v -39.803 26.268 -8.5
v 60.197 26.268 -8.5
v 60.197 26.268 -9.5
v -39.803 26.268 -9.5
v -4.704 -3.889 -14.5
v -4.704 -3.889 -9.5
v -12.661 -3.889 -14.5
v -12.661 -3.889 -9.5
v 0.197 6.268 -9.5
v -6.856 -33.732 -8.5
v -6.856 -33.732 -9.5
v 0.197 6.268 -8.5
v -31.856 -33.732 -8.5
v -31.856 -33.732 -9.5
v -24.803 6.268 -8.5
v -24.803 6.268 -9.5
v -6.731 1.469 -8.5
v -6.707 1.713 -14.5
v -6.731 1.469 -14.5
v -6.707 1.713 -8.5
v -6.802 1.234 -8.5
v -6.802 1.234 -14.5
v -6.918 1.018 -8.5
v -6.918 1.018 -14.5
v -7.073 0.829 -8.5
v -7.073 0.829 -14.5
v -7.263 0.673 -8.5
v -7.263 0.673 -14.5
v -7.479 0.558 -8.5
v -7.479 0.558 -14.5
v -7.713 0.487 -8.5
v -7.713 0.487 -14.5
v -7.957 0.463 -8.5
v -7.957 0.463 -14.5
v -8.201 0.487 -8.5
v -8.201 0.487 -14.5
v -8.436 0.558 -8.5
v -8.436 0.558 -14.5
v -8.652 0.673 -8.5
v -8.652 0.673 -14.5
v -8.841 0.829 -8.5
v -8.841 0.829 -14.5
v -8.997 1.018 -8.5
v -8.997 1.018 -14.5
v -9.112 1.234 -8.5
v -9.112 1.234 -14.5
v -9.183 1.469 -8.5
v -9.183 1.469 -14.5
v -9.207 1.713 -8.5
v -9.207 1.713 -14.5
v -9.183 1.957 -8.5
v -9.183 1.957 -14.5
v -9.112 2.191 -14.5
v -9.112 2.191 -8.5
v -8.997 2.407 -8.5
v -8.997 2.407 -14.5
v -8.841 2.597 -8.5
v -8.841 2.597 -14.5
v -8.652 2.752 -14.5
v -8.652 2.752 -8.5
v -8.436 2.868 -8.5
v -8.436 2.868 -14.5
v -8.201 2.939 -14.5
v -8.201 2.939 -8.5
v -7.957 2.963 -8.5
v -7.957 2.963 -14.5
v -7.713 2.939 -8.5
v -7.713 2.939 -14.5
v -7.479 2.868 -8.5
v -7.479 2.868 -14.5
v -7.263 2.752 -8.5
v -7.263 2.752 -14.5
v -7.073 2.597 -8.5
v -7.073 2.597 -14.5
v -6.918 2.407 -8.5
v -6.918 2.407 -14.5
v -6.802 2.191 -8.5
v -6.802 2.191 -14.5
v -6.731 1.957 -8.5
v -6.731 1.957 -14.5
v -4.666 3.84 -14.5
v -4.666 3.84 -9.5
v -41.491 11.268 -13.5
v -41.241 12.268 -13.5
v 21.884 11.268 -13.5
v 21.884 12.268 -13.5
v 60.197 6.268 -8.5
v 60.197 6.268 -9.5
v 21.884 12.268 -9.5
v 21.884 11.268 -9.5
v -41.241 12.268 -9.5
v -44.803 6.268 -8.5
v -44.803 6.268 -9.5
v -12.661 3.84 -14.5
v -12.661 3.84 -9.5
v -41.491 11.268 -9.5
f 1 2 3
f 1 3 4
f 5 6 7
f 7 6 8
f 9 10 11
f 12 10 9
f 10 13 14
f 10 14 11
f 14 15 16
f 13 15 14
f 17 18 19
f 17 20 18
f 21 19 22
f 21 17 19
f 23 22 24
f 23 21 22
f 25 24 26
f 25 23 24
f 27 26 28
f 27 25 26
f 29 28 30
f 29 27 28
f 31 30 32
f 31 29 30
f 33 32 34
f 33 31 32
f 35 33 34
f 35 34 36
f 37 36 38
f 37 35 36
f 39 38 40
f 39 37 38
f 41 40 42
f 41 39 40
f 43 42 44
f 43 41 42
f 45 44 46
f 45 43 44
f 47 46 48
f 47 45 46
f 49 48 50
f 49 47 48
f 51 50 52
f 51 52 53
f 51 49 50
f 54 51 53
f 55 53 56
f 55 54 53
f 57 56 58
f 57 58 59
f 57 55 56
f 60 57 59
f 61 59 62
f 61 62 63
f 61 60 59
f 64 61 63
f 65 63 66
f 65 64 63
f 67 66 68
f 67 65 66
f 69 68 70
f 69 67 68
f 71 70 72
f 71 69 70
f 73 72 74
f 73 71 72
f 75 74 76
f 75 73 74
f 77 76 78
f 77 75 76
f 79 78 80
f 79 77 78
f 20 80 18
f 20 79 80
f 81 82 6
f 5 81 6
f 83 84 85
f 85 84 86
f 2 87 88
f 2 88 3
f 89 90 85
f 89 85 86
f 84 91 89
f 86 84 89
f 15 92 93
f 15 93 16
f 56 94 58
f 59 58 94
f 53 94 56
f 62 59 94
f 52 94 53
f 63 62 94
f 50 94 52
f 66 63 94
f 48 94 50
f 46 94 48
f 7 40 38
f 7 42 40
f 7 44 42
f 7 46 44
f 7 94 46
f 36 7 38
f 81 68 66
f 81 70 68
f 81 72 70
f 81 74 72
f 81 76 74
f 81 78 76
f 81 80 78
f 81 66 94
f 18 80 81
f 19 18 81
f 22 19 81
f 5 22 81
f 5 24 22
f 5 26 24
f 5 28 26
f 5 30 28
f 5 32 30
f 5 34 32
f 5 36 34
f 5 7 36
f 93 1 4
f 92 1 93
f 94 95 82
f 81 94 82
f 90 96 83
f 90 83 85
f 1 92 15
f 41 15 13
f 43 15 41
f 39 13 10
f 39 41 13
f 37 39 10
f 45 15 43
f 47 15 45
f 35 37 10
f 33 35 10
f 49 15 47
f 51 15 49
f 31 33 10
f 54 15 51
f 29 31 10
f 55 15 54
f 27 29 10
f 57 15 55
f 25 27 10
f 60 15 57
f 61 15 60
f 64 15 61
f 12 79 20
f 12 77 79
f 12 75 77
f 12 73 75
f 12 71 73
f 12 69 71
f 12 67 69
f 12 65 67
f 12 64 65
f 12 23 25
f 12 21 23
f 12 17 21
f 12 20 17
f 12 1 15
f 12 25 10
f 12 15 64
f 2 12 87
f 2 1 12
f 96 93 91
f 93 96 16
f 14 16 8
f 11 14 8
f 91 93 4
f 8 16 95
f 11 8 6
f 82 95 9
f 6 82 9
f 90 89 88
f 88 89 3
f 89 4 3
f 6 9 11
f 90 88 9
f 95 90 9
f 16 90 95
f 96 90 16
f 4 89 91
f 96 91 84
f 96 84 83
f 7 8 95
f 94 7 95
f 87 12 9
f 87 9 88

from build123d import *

# Parameters (mm, degrees)
F1_DEPTH  = 9.5
F3_DEPTH  = 18
F4_R      = 4.5
F5_DEPTH  = 40
F7_DEPTH  = 1
F9_DEPTH  = 5
F8_W      = 1
F8_H      = 3
F10_DEPTH = 18
F11_DEPTH = 18
F12_R     = 1
F13_DEPTH = 6.9
F15_DEPTH = 3
F16_R     = 1.25
F17_DEPTH = 5
F18_DEPTH = 18
F19_DEPTH = 10
F20_DEPTH = 5
F21_R     = 1.25
F22_DEPTH = 5


with BuildPart() as f1:
    # F0 (on Top) → F1 (new body, symmetric)
    with BuildSketch(Plane.XY):
        Polygon((60.1971853051, 26.2679918303), (-39.8028146949, 26.2679918303), (-44.8028146949, 6.2679918303), (-24.8028146949, 6.2679918303), (-31.8558939232, -33.7320081697), (-6.8558939232, -33.7320081697), (0.1971853051, 6.2679918303), (60.1971853051, 6.2679918303), align=None)
    extrude(amount=F1_DEPTH, both=True)

    # F2 (on face) → F3 (cut)
    with BuildSketch(Plane.XY.offset(9.5)):
        Polygon((21.8837381179, 24.7679918303), (-38.1162618821, 24.7679918303), (-42.2412618821, 8.2679918303), (-22.4193075097, 8.2679918303), (-27.2986237894, -19.4039858791), (-6.3603302369, -19.4039858791), (-1.8336679186, 6.2679918303), (-17.4193075097, 6.2679918303), (-17.4193075097, 8.2679918303), (56.8837381179, 8.2679918303), (56.8837381179, 11.2679918303), (21.8837381179, 11.2679918303), align=None)
    extrude(amount=-F3_DEPTH, mode=Mode.SUBTRACT)

    # F4 (on face) → F5 (cut)
    with BuildSketch(Plane.YZ.offset(60.1971853051)):
        with Locations((19.7679918303, 0)):
            Circle(F4_R)
    extrude(amount=-F5_DEPTH, mode=Mode.SUBTRACT)

    # F6 (on Top) → F7 (cut, symmetric)
    with BuildSketch(Plane.XY):
        Polygon((21.808039397, 22.0530666411), (21.808039397, 29.0336320457), (-29.6180322766, 28.4013450146), (-29.6180322766, 22.0530666411), align=None)
    extrude(amount=F7_DEPTH, both=True, mode=Mode.SUBTRACT)

    # F8 (on face) → F9 (join)
    with BuildSketch(Plane.XY.offset(-8.5)):
        Polygon((-41.4912618821, 11.2679918303), (21.8837381179, 11.2679918303), (21.8837381179, 12.2679918303), (20.8837381179, 12.2679918303), (-41.2412618821, 12.2679918303), align=None)
    extrude(amount=F9_DEPTH)

    # F8 (on face) → F10 (join, through all)
    with BuildSketch(Plane.XY.offset(-8.5)):
        with Locations((21.3837381179, 23.2679918303)):
            Rectangle(F8_W, F8_H)
    extrude(amount=F10_DEPTH)

    # F8 (on face) → F11 (join, through all)
    with BuildSketch(Plane.XY.offset(-8.5)):
        with Locations((21.3837381179, 13.7679918303)):
            Rectangle(F8_W, F8_H)
    extrude(amount=F11_DEPTH)

    # F12 (on face) → F13 (cut)
    with BuildSketch(Plane.XZ.offset(-6.2679918303)):
        with Locations((52.1971853051, 0)):
            Circle(F12_R)
    extrude(amount=-F13_DEPTH, mode=Mode.SUBTRACT)

    # F14 (on Top) → F15 (cut, symmetric)
    with BuildSketch(Plane.XY):
        Polygon((7.0393216934, 1.2679918303), (-9.7211528242, 1.2679918303), (-8.9475925263, -10.7320081697), (7.0393216934, -10.7320081697), align=None)
    extrude(amount=F15_DEPTH, both=True, mode=Mode.SUBTRACT)

    # F16 (on face) → F17 (cut)
    with BuildSketch(Plane.XY.offset(-8.5)):
        with Locations((-7.9571865499, 1.7126952298)):
            Circle(F16_R)
    extrude(amount=-F17_DEPTH, mode=Mode.SUBTRACT)

    # F18 (cut): a face of the model
    f18_faces = [f1.faces().sort_by_distance(p)[0] for p in [
        (30.1971853051, 7.4773304926, 9.5),
    ]]
    extrude(f18_faces, amount=-F18_DEPTH, mode=Mode.SUBTRACT)

    # F19 (add): a face of the model
    f19_faces = [f1.faces().sort_by_distance(p)[0] for p in [
        (-9.7413030547, 11.7676624495, -3.5),
    ]]
    extrude(f19_faces, amount=-F19_DEPTH)

    # F20 (cut): a face of the model
    f20_faces = [f1.faces().sort_by_distance(p)[0] for p in [
        (-9.7413030547, 11.7676624495, -3.5),
    ]]
    extrude(f20_faces, amount=-F20_DEPTH, mode=Mode.SUBTRACT)

    # F21 (on face) → F22 (join)
    with BuildSketch(Plane(origin=(0, 0, -9.5), x_dir=(1, 0, 0), z_dir=(0, 0, -1))):
        Polygon((-12.660975568, -3.839584766), (-4.6663652174, -3.839584766), (-4.7040209174, 3.888861509), (-12.660975568, 3.888861509), align=None)
        with Locations((-7.9571865499, -1.7126952298)):
            Circle(F21_R, mode=Mode.SUBTRACT)
    extrude(amount=F22_DEPTH)


solid = f1.part
